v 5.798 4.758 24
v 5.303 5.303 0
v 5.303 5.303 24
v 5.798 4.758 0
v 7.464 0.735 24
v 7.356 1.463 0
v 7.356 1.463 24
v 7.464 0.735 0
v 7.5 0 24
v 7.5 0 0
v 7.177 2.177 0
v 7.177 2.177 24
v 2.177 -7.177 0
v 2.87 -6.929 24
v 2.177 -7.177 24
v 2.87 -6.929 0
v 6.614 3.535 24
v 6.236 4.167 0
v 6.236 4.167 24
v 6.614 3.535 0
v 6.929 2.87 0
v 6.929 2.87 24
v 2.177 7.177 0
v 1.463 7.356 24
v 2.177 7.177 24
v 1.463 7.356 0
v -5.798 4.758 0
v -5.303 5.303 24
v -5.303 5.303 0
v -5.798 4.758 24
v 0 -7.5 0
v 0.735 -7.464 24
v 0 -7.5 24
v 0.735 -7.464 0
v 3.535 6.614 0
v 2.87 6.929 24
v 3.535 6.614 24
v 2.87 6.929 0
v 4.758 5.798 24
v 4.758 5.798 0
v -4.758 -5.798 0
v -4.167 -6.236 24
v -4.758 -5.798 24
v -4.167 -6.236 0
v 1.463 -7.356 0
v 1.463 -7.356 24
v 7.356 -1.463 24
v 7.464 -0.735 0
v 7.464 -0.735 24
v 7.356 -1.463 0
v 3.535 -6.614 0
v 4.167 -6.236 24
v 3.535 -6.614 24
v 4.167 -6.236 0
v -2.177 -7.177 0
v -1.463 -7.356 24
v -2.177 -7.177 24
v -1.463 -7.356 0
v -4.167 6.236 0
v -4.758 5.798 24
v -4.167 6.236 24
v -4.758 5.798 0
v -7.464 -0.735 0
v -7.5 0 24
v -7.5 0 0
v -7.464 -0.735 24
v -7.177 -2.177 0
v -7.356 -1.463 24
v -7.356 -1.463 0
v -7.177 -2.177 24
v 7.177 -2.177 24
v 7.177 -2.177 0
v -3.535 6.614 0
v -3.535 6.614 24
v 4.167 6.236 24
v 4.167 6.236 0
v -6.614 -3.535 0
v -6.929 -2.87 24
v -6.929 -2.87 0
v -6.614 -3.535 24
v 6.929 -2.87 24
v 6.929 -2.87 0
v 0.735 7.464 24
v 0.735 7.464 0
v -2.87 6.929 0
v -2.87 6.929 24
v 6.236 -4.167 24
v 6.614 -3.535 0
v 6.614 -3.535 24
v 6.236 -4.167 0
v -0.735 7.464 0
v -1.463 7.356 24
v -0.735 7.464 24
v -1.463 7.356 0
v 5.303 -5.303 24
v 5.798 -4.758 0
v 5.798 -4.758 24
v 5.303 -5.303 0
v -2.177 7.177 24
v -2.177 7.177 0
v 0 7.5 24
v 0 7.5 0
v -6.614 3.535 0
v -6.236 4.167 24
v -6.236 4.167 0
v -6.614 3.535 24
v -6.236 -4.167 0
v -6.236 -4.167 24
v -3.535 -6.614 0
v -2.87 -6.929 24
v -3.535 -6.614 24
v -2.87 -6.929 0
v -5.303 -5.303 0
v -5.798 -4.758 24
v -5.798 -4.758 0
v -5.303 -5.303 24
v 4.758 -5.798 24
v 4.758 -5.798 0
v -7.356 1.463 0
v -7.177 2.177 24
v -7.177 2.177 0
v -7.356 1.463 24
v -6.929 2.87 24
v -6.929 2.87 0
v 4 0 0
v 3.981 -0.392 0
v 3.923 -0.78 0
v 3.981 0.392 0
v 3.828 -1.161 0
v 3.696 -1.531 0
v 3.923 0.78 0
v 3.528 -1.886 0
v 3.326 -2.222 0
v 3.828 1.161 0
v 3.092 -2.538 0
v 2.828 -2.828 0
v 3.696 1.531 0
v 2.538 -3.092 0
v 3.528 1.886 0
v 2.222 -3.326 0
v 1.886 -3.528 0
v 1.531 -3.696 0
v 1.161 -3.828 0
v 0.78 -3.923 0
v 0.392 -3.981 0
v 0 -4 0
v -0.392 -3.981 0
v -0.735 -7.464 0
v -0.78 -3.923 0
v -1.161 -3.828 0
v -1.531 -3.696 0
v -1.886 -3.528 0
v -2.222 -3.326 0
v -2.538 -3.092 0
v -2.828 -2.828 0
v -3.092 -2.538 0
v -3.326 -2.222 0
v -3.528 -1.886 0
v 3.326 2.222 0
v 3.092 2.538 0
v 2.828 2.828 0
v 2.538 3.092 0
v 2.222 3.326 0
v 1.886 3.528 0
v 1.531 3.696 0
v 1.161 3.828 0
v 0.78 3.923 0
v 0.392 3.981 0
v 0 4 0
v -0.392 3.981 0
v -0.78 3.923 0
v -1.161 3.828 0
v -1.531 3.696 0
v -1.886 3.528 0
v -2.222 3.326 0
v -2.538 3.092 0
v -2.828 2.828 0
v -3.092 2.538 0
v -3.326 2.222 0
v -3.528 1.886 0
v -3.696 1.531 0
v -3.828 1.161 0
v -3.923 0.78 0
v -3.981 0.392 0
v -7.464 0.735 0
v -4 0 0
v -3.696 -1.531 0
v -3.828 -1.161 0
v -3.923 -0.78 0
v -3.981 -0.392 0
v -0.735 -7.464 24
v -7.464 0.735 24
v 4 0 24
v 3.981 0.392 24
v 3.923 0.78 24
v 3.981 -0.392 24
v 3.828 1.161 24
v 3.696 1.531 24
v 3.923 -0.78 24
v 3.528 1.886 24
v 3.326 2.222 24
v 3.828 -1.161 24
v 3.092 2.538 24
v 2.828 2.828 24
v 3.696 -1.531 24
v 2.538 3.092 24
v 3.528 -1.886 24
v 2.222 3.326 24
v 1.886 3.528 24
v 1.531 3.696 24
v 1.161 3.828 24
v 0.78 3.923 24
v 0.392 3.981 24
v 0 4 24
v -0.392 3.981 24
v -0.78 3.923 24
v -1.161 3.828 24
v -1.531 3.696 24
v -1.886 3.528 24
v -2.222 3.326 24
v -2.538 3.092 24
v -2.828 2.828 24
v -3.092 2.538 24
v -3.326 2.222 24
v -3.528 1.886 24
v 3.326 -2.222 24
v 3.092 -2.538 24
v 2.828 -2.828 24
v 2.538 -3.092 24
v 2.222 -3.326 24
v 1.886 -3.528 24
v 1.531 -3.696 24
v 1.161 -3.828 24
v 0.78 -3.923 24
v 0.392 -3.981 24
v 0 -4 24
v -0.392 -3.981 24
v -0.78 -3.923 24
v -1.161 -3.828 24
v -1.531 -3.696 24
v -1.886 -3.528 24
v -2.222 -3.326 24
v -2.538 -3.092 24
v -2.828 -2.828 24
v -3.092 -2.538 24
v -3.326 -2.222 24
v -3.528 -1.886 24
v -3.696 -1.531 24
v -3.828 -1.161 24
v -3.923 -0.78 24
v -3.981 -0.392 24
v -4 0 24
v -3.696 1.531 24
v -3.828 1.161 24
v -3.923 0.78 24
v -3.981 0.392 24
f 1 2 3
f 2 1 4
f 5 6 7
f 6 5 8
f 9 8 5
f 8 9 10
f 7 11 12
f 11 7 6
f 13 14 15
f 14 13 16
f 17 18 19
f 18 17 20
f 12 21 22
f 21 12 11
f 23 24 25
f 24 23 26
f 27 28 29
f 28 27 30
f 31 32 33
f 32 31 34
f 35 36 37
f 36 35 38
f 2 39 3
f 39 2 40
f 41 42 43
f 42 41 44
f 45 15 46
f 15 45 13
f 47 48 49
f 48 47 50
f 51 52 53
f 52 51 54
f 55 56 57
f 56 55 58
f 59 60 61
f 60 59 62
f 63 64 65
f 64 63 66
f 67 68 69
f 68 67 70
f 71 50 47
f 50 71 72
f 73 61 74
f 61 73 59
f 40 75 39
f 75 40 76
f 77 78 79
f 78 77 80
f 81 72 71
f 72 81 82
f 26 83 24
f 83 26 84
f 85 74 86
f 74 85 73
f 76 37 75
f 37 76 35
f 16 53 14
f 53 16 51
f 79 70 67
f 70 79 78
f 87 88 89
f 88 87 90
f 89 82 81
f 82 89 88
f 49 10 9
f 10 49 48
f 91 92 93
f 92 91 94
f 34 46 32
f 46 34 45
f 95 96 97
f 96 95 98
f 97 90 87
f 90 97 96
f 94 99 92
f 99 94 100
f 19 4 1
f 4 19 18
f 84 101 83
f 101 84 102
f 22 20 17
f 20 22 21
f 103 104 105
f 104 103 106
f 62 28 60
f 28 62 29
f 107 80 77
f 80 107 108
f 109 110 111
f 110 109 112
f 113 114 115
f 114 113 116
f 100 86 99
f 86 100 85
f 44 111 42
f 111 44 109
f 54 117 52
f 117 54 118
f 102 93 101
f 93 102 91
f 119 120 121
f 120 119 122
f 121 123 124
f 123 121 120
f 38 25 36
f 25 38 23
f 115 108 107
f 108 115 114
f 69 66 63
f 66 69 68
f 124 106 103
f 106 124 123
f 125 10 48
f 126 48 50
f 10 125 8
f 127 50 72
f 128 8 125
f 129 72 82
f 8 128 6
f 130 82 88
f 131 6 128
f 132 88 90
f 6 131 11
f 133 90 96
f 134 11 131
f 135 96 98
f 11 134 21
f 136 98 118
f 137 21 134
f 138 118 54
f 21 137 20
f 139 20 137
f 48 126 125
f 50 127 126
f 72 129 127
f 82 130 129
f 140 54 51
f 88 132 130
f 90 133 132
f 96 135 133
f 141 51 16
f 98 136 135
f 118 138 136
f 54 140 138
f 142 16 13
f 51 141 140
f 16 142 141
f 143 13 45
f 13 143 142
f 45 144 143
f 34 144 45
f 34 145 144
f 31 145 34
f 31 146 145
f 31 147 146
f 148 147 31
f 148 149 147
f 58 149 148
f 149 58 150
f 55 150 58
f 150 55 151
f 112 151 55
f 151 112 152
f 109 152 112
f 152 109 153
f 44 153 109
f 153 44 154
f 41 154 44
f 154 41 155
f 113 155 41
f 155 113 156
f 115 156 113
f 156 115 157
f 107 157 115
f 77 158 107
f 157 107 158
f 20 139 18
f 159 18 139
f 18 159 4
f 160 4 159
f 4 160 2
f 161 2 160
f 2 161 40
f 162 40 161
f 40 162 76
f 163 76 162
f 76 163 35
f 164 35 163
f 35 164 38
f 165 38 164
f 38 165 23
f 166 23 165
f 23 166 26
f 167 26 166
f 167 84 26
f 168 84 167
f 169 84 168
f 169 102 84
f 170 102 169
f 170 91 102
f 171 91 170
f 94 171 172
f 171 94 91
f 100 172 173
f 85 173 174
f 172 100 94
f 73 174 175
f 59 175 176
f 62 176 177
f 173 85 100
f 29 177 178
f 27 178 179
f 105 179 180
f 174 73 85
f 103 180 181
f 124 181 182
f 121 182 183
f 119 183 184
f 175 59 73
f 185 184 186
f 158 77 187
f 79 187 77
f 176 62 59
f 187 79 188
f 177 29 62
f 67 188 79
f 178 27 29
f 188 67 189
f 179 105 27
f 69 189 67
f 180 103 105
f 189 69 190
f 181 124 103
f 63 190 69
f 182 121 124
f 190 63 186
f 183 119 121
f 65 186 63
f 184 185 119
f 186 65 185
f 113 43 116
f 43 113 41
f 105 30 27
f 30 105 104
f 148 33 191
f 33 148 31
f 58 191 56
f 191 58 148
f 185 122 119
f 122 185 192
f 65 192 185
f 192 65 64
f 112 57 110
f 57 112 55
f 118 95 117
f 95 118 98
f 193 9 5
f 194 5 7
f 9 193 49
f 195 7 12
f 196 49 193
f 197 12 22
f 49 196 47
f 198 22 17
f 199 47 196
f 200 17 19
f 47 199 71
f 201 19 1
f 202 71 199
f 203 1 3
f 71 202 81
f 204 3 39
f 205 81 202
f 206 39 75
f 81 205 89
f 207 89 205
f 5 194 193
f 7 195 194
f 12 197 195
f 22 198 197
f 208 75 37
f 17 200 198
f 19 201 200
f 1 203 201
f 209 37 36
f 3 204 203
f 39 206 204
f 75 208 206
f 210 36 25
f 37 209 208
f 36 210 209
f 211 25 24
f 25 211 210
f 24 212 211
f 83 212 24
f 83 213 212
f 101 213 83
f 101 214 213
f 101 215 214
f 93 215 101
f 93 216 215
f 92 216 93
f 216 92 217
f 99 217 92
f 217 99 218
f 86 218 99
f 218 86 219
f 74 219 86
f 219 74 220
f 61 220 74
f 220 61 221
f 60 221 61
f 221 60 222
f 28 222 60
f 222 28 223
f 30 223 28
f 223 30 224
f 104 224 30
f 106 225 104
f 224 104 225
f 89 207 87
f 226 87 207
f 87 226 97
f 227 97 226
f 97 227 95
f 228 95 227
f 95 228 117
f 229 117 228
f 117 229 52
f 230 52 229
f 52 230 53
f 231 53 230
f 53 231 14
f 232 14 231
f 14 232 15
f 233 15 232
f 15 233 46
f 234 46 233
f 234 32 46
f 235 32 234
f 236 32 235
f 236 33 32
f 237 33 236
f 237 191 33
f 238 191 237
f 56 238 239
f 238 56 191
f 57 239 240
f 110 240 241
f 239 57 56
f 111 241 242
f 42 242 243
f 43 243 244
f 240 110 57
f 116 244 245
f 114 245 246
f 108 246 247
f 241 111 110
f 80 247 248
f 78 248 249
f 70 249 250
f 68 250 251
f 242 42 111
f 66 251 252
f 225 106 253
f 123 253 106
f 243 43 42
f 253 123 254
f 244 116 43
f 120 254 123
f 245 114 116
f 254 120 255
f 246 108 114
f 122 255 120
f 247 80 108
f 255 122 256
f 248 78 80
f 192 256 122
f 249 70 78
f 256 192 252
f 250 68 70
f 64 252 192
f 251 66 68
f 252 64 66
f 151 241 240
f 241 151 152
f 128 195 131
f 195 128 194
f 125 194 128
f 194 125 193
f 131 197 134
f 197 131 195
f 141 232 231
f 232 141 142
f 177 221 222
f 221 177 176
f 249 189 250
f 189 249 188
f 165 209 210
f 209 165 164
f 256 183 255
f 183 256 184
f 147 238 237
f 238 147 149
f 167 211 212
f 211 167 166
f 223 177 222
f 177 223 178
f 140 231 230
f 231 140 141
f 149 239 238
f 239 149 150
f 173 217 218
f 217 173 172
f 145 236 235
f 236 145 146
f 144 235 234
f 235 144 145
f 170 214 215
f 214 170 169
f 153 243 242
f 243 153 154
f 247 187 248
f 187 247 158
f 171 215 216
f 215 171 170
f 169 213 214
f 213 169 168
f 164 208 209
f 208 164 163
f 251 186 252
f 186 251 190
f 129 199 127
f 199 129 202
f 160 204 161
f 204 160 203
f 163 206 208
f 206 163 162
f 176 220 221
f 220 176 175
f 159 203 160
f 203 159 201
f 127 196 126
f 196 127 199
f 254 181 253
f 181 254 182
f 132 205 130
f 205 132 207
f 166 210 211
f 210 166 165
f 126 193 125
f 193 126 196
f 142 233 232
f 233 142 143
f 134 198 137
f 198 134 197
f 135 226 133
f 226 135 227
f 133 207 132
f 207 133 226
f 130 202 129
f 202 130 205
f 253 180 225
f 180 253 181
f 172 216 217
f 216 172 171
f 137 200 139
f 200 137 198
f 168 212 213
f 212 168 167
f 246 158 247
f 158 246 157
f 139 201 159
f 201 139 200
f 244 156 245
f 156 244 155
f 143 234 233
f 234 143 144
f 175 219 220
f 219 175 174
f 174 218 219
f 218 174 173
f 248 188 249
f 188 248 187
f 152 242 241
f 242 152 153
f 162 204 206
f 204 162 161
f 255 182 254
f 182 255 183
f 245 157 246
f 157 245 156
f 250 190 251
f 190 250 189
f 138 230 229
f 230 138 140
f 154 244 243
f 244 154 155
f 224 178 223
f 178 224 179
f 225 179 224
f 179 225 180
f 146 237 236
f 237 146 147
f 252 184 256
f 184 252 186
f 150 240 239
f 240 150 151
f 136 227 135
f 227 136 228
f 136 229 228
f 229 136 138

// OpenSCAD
module linear_bearing() {
    difference() {
        // Outer cylinder
        cylinder(h = 24.0, d = 15.0, $fn = 64);
        // Inner bore
        translate([0, 0, -1]) // Extend slightly to ensure clean cut
        cylinder(h = 26.0, d = 8.0, $fn = 64);
    }
}

linear_bearing();
